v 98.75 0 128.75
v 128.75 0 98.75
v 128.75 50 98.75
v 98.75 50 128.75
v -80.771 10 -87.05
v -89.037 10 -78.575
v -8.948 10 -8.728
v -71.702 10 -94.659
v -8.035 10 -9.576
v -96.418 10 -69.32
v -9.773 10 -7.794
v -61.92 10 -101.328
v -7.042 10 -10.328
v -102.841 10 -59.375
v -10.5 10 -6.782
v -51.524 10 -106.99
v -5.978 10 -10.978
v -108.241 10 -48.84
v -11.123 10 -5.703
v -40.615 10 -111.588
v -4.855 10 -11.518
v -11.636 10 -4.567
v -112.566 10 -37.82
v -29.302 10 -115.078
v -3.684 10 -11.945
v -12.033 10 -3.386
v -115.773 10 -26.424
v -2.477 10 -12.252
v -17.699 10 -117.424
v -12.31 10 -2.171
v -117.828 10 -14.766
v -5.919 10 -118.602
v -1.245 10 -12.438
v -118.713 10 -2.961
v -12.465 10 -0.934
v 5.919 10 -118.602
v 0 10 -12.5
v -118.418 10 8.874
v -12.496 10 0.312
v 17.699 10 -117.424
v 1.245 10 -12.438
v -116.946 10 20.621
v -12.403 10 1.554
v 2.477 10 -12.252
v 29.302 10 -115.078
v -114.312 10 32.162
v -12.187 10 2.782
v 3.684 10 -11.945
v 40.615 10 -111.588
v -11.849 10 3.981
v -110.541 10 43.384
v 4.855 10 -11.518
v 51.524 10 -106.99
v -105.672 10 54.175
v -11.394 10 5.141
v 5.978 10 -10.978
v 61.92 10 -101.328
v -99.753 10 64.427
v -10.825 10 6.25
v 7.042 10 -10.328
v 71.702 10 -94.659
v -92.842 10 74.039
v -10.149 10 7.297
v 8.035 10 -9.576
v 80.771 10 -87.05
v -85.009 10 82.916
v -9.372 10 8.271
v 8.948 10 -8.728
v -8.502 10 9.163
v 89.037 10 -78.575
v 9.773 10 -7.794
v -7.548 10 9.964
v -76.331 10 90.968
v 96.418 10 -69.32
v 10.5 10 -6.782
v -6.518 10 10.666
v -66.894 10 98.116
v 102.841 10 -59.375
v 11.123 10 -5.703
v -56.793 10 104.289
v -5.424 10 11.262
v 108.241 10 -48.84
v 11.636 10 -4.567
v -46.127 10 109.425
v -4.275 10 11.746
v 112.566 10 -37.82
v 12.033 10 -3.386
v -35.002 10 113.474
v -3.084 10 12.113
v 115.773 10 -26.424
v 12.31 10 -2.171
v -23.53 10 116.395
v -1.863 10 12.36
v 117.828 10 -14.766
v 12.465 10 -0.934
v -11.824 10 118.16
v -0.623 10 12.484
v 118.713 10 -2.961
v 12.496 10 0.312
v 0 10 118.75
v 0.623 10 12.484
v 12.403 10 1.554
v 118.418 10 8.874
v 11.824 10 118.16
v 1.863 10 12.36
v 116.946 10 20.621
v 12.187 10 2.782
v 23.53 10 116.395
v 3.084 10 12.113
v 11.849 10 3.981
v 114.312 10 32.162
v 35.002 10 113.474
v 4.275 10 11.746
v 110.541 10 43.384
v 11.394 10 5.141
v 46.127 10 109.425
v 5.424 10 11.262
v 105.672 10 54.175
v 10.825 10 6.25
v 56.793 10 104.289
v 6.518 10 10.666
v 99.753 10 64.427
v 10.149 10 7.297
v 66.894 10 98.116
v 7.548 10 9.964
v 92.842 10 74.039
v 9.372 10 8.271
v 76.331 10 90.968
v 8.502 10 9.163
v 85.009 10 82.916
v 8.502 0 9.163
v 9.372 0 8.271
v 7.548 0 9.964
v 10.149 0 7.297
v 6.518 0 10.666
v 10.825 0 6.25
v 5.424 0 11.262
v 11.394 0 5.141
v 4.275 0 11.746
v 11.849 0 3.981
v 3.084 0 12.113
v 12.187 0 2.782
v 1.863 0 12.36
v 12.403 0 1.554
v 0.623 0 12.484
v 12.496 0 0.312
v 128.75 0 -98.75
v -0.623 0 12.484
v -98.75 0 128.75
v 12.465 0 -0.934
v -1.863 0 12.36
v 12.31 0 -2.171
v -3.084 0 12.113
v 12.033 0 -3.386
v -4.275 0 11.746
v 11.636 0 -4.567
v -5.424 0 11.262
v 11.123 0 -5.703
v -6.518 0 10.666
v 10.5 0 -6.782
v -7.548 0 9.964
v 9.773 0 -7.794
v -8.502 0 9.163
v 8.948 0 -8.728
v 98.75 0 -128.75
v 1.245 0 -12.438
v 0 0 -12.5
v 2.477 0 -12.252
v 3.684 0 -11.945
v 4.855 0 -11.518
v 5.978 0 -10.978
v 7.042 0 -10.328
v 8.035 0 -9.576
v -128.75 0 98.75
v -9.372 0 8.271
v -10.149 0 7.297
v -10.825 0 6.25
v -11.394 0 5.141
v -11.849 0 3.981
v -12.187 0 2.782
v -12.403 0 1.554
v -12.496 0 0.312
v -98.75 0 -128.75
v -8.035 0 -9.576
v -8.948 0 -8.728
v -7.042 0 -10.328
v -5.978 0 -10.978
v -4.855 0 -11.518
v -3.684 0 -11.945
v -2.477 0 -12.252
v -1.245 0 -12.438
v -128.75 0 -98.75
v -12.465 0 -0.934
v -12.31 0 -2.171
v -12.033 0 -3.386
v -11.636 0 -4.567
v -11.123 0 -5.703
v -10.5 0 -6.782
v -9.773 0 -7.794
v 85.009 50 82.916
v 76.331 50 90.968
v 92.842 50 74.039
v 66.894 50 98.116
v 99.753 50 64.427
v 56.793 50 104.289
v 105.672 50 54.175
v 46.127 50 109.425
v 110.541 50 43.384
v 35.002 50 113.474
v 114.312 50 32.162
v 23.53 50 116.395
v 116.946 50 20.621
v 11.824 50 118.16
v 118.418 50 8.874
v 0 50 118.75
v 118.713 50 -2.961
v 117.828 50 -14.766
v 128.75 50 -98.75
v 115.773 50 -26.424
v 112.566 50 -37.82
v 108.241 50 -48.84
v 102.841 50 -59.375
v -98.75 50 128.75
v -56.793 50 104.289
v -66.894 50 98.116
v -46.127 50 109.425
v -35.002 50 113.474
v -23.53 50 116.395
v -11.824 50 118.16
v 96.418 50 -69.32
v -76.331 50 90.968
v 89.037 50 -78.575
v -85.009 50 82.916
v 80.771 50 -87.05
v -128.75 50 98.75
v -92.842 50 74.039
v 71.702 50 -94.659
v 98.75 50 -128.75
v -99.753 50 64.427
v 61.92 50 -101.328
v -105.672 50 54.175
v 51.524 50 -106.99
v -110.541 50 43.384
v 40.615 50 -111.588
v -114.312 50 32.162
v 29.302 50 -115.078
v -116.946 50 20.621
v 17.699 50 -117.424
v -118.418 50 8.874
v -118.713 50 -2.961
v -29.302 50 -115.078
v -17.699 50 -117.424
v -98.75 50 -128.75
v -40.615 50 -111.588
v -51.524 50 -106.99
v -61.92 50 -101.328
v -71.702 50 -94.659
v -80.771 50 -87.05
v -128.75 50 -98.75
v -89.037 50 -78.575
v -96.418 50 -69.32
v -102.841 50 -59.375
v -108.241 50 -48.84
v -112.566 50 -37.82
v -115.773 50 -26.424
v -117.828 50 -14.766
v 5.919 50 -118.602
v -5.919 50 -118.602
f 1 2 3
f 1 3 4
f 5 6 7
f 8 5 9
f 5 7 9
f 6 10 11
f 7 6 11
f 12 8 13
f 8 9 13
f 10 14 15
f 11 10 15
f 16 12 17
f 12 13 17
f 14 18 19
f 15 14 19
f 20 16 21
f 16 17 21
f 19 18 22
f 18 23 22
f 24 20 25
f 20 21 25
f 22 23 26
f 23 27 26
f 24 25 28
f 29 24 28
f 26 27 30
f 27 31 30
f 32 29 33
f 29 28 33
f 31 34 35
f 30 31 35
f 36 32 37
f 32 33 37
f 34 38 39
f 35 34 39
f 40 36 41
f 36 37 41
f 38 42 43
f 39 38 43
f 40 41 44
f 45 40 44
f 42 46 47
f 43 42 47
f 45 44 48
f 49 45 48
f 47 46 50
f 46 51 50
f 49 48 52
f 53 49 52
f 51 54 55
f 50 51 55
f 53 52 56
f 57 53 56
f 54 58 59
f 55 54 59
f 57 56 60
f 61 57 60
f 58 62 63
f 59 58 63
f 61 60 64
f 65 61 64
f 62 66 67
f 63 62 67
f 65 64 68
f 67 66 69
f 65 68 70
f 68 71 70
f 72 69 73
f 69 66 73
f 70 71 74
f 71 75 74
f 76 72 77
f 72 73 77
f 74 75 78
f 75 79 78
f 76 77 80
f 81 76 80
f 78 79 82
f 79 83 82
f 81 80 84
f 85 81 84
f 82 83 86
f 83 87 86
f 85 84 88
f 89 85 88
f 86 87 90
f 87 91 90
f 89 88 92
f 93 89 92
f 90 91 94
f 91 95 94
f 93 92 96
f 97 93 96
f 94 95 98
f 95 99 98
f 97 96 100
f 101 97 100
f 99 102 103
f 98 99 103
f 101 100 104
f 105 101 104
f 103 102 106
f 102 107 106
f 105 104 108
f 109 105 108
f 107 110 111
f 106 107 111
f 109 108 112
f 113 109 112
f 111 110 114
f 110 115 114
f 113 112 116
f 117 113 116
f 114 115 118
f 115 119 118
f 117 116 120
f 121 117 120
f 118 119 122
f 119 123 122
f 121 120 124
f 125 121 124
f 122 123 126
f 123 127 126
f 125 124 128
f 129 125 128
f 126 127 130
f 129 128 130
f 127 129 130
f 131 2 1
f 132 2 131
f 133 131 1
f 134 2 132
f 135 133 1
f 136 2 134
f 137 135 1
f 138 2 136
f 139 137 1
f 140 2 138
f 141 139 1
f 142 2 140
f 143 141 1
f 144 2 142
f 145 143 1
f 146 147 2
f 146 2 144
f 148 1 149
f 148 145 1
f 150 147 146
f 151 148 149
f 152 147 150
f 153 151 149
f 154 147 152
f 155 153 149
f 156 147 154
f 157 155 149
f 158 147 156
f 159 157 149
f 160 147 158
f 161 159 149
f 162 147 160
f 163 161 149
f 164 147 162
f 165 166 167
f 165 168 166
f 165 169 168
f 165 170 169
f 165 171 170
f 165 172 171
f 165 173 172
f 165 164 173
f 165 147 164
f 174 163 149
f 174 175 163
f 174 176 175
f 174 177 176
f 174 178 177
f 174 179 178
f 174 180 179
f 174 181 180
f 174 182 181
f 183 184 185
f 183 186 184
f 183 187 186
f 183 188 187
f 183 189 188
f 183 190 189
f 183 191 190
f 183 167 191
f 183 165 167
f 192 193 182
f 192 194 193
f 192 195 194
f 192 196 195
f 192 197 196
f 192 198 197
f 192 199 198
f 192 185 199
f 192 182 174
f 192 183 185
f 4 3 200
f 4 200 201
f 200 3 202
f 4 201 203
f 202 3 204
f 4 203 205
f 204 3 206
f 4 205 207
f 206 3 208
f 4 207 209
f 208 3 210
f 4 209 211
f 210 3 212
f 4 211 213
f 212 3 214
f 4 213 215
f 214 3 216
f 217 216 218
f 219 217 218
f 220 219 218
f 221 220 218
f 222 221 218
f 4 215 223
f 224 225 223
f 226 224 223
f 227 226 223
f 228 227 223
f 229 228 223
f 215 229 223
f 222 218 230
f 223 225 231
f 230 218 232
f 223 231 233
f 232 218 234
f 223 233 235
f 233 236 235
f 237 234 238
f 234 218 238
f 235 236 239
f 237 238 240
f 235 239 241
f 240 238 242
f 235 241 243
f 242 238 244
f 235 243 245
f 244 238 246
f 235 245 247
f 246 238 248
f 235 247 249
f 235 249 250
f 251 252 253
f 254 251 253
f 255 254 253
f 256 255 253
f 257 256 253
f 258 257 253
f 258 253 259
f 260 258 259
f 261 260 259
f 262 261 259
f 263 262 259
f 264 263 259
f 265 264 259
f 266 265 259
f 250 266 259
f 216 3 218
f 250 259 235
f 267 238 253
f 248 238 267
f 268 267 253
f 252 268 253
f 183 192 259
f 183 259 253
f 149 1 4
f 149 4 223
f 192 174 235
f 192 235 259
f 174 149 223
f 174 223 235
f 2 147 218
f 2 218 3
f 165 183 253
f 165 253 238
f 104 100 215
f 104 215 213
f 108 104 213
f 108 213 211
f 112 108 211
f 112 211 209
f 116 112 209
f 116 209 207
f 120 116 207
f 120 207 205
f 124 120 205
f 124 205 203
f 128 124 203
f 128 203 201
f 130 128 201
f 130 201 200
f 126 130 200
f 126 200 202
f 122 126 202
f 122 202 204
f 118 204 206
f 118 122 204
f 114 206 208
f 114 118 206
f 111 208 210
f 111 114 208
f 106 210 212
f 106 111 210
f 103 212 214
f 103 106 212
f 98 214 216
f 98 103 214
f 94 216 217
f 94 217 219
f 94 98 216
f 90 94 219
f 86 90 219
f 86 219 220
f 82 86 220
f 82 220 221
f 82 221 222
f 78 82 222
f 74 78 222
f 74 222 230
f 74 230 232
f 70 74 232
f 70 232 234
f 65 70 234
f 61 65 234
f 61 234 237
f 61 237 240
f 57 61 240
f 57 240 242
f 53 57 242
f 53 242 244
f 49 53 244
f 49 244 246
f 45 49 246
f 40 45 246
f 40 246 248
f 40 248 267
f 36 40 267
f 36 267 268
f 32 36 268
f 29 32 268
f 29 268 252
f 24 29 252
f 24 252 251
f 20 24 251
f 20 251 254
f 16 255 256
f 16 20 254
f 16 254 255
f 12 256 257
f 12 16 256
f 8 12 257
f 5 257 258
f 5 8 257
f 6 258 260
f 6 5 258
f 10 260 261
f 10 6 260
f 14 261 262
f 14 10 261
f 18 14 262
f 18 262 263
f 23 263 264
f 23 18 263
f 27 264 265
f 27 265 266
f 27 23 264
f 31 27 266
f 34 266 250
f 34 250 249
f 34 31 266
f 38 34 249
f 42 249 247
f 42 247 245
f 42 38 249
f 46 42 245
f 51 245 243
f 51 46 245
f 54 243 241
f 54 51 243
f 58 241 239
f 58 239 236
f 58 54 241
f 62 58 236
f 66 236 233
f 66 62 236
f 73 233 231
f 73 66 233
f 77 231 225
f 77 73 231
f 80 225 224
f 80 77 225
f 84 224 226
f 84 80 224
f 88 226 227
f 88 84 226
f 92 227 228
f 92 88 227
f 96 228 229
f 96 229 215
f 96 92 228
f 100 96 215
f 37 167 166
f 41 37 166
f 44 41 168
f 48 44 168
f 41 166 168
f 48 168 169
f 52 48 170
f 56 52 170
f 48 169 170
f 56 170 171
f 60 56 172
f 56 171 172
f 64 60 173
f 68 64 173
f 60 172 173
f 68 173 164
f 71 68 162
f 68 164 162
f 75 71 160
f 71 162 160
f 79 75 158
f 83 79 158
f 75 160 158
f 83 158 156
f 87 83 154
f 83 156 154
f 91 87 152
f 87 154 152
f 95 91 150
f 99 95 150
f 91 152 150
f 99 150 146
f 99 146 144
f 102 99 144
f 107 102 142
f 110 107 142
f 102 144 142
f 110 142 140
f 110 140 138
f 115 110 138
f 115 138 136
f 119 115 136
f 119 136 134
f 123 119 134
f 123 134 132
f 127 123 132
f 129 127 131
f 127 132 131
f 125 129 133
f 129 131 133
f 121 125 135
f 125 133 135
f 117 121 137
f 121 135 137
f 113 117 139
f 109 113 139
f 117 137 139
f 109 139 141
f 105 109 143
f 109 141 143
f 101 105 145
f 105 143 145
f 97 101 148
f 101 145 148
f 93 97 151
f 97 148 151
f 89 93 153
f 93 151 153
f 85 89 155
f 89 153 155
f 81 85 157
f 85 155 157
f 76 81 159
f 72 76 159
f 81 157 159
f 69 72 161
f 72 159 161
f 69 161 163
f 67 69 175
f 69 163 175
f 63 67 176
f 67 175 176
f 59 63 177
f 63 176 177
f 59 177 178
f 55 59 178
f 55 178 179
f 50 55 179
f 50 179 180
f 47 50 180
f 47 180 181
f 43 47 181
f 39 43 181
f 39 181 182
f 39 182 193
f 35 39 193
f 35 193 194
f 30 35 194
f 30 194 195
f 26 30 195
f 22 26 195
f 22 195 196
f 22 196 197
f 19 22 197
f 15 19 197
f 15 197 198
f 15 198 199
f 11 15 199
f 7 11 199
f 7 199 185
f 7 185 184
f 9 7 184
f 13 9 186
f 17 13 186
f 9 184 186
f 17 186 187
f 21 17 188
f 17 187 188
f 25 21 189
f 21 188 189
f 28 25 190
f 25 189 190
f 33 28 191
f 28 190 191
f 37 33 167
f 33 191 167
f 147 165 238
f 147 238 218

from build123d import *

# Parameters (mm, degrees)
SKETCH_1_R      = 118.75
EXTRUDE_1_DEPTH = 50
SKETCH_2_R      = 12.5
EXTRUDE_2_DEPTH = 10


with BuildPart() as part:
    # 草圖1 → 填料-伸長1 (new body)
    with BuildSketch(Plane(origin=(0, 0, 0), x_dir=(1, 0, 0), z_dir=(0, 1, 0))):
        Polygon((98.75, 128.75), (128.75, 98.75), (128.75, -98.75), (98.75, -128.75), (-98.75, -128.75), (-128.75, -98.75), (-128.75, 98.75), (-98.75, 128.75), align=None)
        with Locations(Location((0, 0, 0), (0, 0, 270))):
            Circle(SKETCH_1_R, mode=Mode.SUBTRACT)
    extrude(amount=EXTRUDE_1_DEPTH)

    # 草圖2 → 填料-伸長2 (add)
    with BuildSketch(Plane.XZ):
        Polygon((98.75, -128.75), (128.75, -98.75), (128.75, 98.75), (98.75, 128.75), (-98.75, 128.75), (-128.75, 98.75), (-128.75, -98.75), (-98.75, -128.75), align=None)
        with Locations(Location((0, 0, 0), (0, 0, 270))):
            Circle(SKETCH_2_R, mode=Mode.SUBTRACT)
    extrude(amount=-EXTRUDE_2_DEPTH)


solid = part.part
